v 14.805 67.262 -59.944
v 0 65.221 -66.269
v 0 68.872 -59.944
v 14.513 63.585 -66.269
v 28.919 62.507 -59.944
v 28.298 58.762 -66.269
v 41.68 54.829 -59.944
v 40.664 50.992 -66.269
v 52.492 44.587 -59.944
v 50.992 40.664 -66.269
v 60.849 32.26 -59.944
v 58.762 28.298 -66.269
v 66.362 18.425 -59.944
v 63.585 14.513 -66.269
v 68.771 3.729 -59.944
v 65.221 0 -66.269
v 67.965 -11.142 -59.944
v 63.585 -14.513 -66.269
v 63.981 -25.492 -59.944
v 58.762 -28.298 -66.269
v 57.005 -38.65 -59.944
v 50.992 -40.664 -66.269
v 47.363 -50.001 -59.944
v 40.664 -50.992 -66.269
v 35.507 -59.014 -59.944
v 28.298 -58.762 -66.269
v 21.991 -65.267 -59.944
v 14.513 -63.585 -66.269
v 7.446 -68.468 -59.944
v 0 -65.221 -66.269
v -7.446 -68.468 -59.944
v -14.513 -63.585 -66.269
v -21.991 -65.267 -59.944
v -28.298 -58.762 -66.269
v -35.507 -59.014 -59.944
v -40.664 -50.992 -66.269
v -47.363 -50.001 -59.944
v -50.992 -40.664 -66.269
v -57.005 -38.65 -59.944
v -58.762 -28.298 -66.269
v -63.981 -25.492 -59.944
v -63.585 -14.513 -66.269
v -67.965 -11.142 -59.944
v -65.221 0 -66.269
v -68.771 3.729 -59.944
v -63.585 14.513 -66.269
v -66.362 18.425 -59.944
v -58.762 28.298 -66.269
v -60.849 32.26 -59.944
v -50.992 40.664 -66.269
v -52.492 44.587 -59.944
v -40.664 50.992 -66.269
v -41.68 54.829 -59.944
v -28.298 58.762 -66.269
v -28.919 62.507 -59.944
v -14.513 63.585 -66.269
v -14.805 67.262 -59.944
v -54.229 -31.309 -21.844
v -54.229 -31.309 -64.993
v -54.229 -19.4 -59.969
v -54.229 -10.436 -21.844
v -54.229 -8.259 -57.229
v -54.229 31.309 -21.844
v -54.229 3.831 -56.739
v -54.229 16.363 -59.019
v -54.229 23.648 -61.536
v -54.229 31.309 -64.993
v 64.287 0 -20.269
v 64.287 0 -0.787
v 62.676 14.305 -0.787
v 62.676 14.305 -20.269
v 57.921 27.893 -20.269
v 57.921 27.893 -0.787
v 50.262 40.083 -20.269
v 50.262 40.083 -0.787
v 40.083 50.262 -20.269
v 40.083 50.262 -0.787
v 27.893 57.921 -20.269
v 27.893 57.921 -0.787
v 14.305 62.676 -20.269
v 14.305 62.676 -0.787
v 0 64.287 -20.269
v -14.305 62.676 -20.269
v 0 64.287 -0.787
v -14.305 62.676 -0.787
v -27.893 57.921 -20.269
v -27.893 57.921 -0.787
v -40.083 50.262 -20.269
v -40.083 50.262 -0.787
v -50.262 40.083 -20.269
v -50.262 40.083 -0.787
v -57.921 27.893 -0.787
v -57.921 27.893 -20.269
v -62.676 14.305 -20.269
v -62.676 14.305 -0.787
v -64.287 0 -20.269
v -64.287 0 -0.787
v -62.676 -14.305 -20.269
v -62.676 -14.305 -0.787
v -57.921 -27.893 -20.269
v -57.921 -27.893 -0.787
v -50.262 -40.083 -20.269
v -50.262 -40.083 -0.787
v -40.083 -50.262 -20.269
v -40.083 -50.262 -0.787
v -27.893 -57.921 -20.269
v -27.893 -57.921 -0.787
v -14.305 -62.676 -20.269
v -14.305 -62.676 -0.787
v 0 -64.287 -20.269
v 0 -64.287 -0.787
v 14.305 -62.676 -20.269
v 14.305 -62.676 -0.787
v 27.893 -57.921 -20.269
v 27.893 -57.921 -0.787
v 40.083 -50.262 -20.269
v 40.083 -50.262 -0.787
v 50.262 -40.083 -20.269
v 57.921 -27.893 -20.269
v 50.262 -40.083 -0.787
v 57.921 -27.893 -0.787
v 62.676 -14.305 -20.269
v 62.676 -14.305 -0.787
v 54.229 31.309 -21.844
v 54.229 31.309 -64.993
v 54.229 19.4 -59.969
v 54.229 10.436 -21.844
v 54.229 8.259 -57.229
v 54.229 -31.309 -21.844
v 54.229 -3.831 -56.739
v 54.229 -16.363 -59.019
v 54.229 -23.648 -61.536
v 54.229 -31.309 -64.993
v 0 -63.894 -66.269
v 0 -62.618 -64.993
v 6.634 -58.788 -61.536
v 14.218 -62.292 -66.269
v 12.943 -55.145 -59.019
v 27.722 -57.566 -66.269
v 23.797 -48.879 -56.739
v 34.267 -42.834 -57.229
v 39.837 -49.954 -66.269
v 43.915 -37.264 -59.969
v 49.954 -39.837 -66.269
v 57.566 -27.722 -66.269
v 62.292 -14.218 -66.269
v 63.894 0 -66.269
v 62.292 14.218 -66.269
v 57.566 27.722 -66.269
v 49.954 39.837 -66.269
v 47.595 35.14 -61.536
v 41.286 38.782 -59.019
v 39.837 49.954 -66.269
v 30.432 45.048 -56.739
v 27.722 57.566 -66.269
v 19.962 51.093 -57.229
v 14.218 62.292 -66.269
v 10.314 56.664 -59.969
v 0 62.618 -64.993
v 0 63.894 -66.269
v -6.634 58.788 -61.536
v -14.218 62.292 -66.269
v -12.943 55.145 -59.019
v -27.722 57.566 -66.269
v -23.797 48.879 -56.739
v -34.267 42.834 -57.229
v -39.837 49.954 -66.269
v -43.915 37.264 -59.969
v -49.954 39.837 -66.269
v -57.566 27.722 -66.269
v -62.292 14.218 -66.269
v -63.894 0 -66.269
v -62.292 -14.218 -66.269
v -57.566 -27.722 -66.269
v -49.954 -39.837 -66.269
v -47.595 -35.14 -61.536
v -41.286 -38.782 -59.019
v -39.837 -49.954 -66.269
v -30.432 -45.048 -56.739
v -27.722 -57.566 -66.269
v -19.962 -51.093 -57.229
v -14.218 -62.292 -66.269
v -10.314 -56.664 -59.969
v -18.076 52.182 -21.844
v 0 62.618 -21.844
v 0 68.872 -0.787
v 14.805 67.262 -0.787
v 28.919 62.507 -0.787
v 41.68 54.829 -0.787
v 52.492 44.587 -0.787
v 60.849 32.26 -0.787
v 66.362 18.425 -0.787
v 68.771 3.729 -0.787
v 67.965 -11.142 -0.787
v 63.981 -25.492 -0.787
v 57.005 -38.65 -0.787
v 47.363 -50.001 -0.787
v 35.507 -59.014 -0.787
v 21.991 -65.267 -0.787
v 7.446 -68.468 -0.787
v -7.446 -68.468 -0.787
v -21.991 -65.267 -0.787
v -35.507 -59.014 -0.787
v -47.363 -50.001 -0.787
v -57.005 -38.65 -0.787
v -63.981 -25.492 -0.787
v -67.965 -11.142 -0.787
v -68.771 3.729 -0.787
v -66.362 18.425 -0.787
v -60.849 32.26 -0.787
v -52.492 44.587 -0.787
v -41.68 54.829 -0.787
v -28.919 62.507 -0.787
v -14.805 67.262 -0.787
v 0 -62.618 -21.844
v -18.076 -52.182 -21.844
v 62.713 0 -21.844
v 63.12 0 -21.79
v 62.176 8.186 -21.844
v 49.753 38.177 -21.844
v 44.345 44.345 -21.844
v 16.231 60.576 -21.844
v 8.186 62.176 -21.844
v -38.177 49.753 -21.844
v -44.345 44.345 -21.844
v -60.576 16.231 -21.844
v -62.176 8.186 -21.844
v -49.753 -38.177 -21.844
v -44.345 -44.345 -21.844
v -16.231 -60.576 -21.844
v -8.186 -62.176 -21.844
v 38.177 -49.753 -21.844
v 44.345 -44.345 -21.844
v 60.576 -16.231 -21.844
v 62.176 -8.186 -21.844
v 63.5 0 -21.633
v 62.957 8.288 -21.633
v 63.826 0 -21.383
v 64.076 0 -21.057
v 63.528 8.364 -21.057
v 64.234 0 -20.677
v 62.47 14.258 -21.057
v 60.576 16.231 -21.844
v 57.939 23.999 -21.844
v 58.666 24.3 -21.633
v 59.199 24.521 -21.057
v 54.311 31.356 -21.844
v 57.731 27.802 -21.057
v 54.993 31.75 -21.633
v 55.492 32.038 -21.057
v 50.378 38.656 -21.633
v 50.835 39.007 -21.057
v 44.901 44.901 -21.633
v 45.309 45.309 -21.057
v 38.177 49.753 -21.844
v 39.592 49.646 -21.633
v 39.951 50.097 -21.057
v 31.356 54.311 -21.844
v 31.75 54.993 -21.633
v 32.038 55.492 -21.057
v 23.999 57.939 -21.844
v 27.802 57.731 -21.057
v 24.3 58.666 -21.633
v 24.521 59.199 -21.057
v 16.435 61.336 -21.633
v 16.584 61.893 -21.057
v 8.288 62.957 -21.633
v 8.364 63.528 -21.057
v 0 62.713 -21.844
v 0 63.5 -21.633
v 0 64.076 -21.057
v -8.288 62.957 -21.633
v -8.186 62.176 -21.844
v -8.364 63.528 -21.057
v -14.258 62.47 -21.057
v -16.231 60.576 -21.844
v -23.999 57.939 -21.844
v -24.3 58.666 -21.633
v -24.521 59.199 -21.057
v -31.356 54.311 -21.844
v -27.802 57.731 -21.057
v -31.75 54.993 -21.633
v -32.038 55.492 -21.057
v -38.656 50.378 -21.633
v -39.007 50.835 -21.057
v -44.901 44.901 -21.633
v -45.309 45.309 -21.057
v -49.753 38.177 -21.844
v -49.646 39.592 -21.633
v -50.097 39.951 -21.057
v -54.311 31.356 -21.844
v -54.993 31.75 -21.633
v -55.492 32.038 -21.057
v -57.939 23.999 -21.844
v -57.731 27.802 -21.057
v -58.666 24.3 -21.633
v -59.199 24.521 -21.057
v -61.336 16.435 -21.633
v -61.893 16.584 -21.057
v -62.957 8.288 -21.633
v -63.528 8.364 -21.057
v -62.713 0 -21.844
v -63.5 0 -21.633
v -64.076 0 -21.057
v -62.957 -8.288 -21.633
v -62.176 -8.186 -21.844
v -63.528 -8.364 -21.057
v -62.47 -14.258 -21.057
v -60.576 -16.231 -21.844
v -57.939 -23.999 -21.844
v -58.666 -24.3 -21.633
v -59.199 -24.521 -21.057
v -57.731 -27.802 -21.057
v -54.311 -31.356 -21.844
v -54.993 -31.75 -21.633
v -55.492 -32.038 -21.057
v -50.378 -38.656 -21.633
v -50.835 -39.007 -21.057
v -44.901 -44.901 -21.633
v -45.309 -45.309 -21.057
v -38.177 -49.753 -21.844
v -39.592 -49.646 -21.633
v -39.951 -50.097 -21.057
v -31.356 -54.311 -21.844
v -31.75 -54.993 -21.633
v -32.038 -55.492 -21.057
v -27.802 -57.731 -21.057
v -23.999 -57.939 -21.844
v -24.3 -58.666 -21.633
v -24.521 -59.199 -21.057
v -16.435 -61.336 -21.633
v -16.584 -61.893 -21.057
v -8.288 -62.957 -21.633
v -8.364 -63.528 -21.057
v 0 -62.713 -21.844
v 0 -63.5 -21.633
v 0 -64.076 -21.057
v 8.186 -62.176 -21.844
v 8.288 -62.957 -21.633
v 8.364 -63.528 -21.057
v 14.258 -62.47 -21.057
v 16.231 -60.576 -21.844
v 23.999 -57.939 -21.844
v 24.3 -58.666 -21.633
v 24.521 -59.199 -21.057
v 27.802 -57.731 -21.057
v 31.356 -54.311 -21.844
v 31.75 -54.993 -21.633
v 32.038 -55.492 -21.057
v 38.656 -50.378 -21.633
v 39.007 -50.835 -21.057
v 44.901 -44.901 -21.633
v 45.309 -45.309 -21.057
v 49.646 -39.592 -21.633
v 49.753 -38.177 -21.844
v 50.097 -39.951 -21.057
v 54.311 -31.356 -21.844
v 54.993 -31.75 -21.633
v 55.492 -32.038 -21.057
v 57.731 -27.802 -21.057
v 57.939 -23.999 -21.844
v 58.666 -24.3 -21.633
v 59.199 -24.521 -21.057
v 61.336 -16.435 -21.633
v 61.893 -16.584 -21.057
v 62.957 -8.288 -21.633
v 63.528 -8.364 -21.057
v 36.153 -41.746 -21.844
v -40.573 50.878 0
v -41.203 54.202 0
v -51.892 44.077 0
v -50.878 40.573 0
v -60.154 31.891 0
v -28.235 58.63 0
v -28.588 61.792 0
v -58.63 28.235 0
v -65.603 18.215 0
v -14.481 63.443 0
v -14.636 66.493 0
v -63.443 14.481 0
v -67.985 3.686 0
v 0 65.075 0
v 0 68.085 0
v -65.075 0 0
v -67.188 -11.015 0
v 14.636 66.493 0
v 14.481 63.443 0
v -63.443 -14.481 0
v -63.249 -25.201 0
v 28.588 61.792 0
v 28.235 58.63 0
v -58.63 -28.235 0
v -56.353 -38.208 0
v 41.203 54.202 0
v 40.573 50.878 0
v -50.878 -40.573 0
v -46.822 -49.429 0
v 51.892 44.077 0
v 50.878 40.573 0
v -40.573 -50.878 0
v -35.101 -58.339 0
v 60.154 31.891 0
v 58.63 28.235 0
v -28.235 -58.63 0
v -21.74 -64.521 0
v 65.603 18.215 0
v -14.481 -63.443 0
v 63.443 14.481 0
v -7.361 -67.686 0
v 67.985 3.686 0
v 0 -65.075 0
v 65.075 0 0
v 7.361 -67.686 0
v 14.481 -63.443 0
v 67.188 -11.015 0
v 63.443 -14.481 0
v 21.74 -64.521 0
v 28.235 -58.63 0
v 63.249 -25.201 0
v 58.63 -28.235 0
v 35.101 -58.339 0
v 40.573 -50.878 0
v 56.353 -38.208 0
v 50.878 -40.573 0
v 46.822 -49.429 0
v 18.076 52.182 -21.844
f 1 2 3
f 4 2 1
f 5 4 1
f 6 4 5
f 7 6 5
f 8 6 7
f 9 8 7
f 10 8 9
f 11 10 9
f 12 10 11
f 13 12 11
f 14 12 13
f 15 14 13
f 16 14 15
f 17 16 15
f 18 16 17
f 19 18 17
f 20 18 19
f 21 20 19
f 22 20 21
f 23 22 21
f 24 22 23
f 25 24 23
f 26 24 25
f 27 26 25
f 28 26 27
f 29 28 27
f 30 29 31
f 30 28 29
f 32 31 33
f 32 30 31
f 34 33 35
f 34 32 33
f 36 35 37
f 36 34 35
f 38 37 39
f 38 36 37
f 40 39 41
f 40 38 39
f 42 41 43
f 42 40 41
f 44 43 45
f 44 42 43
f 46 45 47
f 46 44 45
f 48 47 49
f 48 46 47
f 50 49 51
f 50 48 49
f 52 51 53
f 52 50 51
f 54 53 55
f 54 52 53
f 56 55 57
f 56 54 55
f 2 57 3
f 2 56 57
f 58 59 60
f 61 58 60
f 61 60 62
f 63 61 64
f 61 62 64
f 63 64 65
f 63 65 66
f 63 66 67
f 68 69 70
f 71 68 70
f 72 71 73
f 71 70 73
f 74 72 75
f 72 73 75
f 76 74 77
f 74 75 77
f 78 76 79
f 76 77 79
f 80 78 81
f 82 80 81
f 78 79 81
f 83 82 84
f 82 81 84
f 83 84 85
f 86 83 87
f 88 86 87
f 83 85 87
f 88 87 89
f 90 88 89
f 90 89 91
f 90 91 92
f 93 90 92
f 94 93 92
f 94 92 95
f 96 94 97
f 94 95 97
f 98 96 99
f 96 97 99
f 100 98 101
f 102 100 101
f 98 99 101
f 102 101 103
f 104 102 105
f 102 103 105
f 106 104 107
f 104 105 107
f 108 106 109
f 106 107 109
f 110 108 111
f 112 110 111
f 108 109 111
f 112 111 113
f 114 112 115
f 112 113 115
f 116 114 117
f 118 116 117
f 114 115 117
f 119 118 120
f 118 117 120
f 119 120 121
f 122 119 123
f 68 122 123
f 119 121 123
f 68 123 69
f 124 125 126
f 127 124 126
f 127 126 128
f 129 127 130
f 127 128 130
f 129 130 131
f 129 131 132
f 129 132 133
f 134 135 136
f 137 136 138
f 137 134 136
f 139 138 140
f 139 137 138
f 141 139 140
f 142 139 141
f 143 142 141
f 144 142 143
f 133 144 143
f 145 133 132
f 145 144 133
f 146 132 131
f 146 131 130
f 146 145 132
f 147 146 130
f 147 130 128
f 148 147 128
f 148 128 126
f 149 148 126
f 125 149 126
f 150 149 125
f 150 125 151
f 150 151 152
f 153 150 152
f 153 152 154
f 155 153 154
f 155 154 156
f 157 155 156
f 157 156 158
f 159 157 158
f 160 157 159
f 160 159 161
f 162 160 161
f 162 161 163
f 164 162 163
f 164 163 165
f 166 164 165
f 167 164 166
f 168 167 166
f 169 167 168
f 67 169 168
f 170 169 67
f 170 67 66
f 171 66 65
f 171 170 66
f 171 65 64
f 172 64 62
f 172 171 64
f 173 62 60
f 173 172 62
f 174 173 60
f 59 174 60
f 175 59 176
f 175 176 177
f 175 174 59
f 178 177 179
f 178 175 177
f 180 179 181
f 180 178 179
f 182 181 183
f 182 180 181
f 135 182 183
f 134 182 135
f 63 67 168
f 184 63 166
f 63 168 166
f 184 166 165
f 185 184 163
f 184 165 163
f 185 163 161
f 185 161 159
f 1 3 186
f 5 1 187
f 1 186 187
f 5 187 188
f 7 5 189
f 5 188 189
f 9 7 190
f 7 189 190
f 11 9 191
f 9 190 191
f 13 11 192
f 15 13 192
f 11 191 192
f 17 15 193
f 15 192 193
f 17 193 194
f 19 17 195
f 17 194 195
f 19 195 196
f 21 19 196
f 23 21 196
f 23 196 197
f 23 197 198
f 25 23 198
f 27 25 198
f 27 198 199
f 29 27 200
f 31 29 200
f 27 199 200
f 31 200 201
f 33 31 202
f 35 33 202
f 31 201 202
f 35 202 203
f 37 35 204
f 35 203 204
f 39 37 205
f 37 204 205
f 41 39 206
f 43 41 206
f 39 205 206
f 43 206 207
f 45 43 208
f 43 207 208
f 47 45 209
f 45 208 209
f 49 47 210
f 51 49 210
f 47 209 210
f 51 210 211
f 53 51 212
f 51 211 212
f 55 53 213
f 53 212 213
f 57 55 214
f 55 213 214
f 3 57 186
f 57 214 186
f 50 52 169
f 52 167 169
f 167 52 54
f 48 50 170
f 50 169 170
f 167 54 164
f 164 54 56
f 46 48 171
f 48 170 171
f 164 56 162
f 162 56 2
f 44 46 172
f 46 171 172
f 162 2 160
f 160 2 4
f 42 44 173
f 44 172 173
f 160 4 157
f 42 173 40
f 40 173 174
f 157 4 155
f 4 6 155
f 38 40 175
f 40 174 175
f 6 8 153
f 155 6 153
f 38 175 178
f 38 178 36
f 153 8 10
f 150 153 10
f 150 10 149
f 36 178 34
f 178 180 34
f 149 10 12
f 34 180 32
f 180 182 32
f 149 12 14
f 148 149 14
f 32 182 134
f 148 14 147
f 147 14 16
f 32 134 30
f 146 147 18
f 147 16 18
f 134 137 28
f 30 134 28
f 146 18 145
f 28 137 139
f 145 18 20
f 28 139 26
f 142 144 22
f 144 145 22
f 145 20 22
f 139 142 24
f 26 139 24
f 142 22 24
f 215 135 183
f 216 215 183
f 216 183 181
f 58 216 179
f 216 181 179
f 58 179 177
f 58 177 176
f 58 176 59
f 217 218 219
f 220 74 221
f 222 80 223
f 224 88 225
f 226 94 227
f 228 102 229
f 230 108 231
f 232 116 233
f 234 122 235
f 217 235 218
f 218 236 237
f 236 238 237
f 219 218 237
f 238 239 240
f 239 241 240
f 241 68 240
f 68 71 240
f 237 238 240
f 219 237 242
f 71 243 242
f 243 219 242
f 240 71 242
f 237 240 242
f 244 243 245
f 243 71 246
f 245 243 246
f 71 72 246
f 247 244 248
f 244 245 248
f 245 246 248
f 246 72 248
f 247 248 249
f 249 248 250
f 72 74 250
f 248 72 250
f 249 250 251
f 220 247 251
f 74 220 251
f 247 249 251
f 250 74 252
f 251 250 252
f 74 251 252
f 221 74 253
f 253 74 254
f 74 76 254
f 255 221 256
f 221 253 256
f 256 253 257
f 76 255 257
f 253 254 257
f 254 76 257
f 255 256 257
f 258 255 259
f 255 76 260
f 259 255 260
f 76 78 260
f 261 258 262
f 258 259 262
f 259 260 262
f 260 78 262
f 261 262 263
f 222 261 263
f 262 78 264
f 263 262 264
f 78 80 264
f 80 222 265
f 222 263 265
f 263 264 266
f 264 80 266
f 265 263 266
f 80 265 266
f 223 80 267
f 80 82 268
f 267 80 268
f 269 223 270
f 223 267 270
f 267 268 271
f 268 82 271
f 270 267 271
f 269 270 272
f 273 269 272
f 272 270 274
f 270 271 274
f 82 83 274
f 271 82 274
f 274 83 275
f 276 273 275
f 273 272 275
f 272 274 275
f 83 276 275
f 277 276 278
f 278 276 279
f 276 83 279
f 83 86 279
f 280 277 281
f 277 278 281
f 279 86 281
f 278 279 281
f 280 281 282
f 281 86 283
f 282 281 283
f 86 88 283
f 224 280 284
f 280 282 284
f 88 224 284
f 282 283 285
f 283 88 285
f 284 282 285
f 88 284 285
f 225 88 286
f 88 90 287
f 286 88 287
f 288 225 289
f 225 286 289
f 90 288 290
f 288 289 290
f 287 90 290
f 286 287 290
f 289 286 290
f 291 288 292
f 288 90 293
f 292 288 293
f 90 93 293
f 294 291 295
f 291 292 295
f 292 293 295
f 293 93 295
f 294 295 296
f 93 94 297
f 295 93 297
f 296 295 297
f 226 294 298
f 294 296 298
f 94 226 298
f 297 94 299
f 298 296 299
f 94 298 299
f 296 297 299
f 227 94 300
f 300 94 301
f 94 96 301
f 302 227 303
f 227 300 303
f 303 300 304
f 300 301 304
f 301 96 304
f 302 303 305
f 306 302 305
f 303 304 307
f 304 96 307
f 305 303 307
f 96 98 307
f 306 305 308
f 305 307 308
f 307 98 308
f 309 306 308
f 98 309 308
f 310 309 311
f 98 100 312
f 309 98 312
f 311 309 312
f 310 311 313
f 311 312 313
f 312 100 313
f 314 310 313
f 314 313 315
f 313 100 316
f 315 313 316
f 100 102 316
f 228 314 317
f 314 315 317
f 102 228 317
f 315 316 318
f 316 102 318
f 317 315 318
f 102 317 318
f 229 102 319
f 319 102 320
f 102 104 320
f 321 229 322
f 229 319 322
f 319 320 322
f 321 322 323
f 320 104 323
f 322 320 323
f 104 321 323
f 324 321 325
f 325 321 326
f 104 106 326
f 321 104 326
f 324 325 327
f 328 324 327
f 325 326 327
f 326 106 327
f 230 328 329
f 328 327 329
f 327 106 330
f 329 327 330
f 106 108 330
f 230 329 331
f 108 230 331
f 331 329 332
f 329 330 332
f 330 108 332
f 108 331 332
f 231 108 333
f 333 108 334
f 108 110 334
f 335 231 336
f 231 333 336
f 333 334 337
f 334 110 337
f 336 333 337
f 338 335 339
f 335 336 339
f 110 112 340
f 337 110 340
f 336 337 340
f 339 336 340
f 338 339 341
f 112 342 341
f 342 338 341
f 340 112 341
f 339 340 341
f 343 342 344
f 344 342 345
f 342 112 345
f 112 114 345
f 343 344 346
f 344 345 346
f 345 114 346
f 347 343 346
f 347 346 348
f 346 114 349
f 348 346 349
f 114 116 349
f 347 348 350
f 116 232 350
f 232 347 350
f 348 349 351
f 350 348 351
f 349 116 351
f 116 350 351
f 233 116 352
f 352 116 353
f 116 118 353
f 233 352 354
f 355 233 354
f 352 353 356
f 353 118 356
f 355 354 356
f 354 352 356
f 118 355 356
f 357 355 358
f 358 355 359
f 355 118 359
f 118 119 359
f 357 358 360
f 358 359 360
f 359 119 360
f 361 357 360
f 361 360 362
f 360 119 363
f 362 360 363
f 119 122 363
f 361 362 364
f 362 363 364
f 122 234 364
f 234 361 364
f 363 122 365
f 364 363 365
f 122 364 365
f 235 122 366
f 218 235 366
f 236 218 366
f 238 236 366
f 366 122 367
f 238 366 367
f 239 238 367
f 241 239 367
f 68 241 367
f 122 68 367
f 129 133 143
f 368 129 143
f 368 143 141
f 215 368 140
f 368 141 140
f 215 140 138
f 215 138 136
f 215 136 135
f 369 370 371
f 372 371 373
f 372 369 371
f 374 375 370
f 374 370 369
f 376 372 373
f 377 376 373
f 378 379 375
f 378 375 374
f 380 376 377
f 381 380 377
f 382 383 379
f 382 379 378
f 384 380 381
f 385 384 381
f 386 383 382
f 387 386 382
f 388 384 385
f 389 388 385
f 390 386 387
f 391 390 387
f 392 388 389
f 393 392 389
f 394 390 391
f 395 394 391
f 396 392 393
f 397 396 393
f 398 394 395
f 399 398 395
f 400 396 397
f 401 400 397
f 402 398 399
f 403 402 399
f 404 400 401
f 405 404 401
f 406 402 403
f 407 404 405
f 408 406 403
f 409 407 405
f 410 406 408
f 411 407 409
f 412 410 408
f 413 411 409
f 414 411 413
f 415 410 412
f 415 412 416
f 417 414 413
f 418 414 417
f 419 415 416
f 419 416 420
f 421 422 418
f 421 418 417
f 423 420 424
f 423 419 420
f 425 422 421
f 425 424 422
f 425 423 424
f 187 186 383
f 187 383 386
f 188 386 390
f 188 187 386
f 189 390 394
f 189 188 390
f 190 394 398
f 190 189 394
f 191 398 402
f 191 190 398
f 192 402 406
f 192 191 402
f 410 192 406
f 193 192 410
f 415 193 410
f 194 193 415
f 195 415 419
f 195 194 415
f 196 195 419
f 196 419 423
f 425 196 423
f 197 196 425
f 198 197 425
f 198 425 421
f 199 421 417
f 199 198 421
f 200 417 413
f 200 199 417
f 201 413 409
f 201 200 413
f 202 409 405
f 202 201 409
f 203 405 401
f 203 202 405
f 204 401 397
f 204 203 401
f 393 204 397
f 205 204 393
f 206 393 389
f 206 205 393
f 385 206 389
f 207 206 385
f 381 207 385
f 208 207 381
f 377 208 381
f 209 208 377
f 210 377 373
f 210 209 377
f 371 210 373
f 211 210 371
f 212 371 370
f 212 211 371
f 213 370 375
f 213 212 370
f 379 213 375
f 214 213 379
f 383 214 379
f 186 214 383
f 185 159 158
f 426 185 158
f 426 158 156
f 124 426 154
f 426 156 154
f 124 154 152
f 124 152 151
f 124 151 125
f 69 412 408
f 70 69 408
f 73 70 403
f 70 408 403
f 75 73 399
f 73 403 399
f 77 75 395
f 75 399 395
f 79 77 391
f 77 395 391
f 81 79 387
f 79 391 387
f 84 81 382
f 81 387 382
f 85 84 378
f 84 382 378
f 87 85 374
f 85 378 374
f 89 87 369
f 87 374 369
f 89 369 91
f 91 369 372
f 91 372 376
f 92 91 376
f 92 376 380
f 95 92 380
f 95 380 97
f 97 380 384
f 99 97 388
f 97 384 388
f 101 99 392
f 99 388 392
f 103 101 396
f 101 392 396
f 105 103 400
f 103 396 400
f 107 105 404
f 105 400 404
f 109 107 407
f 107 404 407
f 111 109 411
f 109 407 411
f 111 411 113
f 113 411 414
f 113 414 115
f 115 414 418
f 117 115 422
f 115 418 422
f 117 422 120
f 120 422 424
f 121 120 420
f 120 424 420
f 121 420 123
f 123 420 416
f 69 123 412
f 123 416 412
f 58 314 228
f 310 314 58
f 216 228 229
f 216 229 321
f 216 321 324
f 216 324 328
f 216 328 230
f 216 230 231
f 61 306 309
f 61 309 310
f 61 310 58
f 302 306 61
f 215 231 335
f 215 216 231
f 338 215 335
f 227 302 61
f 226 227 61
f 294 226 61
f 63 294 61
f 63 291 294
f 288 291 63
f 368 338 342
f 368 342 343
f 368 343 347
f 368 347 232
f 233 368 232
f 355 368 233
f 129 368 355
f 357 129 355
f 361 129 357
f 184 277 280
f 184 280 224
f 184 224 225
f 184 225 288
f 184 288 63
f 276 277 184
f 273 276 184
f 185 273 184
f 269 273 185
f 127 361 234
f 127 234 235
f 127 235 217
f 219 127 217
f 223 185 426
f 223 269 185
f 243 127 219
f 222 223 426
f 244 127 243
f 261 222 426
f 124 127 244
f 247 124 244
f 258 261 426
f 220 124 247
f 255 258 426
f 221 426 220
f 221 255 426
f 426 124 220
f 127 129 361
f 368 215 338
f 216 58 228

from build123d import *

# Parameters (mm, degrees)
F0_W      = 14.6431
F0_H      = 66.2686
F2_R      = 64.2874
F3_DEPTH  = 21.844
F5_DEPTH  = 66.2696
F6_R      = 1.5748
F7_SIZE   = 0.7874
F10_SIZE2 = 3.65151
F10_SIZE  = 6.3246


with BuildPart() as f1:
    # F0 (on Right) → F1 (revolve)
    with BuildSketch(Plane.YZ):
        with Locations((61.55055, -33.1343)):
            Rectangle(F0_W, F0_H)
    revolve(axis=Axis((0, 0, -33.1343), (0, 0, -1)))

    # F2 (on face) → F3 (cut)
    with BuildSketch(Plane.XY):
        Circle(F2_R)
    extrude(amount=-F3_DEPTH, mode=Mode.SUBTRACT)

    # F4 (on face) → F5 (cut, through all)
    with BuildSketch(Plane(origin=(0, 0, -66.2686), x_dir=(1, 0, 0), z_dir=(0, 0, -1))):
        Polygon((-54.229, 31.309128), (-54.229, -31.309128), (0, -62.618255), (54.229, -31.309128), (54.229, 31.309128), (0, 62.618255), align=None)
    extrude(amount=-F5_DEPTH, mode=Mode.SUBTRACT)

    # F6
    f6_edges = [f1.edges().sort_by_distance(p)[0] for p in [
        (-64.2874, 0, -21.844),
    ]]
    fillet(f6_edges, radius=F6_R)

    # F7
    f7_edges = [f1.edges().sort_by_distance(p)[0] for p in [
        (0, -68.8721, 0),
        (-64.2874, 0, 0),
    ]]
    chamfer(f7_edges, length=F7_SIZE)

    # F8 (on Right) → F9 (revolve, cut)
    with BuildSketch(Plane.YZ):
        Polygon((0, -2.3749), (-63.8937, -66.2686), (0, -66.2686), align=None)
    revolve(axis=Axis((0, 0, -34.32175), (0, 0, 1)), mode=Mode.SUBTRACT)

    # F10
    f10_edges = [f1.edges().sort_by_distance(p)[0] for p in [
        (0, -68.8721, -66.2686),
    ]]
    chamfer(f10_edges, length=F10_SIZE, length2=F10_SIZE2)


solid = f1.part
